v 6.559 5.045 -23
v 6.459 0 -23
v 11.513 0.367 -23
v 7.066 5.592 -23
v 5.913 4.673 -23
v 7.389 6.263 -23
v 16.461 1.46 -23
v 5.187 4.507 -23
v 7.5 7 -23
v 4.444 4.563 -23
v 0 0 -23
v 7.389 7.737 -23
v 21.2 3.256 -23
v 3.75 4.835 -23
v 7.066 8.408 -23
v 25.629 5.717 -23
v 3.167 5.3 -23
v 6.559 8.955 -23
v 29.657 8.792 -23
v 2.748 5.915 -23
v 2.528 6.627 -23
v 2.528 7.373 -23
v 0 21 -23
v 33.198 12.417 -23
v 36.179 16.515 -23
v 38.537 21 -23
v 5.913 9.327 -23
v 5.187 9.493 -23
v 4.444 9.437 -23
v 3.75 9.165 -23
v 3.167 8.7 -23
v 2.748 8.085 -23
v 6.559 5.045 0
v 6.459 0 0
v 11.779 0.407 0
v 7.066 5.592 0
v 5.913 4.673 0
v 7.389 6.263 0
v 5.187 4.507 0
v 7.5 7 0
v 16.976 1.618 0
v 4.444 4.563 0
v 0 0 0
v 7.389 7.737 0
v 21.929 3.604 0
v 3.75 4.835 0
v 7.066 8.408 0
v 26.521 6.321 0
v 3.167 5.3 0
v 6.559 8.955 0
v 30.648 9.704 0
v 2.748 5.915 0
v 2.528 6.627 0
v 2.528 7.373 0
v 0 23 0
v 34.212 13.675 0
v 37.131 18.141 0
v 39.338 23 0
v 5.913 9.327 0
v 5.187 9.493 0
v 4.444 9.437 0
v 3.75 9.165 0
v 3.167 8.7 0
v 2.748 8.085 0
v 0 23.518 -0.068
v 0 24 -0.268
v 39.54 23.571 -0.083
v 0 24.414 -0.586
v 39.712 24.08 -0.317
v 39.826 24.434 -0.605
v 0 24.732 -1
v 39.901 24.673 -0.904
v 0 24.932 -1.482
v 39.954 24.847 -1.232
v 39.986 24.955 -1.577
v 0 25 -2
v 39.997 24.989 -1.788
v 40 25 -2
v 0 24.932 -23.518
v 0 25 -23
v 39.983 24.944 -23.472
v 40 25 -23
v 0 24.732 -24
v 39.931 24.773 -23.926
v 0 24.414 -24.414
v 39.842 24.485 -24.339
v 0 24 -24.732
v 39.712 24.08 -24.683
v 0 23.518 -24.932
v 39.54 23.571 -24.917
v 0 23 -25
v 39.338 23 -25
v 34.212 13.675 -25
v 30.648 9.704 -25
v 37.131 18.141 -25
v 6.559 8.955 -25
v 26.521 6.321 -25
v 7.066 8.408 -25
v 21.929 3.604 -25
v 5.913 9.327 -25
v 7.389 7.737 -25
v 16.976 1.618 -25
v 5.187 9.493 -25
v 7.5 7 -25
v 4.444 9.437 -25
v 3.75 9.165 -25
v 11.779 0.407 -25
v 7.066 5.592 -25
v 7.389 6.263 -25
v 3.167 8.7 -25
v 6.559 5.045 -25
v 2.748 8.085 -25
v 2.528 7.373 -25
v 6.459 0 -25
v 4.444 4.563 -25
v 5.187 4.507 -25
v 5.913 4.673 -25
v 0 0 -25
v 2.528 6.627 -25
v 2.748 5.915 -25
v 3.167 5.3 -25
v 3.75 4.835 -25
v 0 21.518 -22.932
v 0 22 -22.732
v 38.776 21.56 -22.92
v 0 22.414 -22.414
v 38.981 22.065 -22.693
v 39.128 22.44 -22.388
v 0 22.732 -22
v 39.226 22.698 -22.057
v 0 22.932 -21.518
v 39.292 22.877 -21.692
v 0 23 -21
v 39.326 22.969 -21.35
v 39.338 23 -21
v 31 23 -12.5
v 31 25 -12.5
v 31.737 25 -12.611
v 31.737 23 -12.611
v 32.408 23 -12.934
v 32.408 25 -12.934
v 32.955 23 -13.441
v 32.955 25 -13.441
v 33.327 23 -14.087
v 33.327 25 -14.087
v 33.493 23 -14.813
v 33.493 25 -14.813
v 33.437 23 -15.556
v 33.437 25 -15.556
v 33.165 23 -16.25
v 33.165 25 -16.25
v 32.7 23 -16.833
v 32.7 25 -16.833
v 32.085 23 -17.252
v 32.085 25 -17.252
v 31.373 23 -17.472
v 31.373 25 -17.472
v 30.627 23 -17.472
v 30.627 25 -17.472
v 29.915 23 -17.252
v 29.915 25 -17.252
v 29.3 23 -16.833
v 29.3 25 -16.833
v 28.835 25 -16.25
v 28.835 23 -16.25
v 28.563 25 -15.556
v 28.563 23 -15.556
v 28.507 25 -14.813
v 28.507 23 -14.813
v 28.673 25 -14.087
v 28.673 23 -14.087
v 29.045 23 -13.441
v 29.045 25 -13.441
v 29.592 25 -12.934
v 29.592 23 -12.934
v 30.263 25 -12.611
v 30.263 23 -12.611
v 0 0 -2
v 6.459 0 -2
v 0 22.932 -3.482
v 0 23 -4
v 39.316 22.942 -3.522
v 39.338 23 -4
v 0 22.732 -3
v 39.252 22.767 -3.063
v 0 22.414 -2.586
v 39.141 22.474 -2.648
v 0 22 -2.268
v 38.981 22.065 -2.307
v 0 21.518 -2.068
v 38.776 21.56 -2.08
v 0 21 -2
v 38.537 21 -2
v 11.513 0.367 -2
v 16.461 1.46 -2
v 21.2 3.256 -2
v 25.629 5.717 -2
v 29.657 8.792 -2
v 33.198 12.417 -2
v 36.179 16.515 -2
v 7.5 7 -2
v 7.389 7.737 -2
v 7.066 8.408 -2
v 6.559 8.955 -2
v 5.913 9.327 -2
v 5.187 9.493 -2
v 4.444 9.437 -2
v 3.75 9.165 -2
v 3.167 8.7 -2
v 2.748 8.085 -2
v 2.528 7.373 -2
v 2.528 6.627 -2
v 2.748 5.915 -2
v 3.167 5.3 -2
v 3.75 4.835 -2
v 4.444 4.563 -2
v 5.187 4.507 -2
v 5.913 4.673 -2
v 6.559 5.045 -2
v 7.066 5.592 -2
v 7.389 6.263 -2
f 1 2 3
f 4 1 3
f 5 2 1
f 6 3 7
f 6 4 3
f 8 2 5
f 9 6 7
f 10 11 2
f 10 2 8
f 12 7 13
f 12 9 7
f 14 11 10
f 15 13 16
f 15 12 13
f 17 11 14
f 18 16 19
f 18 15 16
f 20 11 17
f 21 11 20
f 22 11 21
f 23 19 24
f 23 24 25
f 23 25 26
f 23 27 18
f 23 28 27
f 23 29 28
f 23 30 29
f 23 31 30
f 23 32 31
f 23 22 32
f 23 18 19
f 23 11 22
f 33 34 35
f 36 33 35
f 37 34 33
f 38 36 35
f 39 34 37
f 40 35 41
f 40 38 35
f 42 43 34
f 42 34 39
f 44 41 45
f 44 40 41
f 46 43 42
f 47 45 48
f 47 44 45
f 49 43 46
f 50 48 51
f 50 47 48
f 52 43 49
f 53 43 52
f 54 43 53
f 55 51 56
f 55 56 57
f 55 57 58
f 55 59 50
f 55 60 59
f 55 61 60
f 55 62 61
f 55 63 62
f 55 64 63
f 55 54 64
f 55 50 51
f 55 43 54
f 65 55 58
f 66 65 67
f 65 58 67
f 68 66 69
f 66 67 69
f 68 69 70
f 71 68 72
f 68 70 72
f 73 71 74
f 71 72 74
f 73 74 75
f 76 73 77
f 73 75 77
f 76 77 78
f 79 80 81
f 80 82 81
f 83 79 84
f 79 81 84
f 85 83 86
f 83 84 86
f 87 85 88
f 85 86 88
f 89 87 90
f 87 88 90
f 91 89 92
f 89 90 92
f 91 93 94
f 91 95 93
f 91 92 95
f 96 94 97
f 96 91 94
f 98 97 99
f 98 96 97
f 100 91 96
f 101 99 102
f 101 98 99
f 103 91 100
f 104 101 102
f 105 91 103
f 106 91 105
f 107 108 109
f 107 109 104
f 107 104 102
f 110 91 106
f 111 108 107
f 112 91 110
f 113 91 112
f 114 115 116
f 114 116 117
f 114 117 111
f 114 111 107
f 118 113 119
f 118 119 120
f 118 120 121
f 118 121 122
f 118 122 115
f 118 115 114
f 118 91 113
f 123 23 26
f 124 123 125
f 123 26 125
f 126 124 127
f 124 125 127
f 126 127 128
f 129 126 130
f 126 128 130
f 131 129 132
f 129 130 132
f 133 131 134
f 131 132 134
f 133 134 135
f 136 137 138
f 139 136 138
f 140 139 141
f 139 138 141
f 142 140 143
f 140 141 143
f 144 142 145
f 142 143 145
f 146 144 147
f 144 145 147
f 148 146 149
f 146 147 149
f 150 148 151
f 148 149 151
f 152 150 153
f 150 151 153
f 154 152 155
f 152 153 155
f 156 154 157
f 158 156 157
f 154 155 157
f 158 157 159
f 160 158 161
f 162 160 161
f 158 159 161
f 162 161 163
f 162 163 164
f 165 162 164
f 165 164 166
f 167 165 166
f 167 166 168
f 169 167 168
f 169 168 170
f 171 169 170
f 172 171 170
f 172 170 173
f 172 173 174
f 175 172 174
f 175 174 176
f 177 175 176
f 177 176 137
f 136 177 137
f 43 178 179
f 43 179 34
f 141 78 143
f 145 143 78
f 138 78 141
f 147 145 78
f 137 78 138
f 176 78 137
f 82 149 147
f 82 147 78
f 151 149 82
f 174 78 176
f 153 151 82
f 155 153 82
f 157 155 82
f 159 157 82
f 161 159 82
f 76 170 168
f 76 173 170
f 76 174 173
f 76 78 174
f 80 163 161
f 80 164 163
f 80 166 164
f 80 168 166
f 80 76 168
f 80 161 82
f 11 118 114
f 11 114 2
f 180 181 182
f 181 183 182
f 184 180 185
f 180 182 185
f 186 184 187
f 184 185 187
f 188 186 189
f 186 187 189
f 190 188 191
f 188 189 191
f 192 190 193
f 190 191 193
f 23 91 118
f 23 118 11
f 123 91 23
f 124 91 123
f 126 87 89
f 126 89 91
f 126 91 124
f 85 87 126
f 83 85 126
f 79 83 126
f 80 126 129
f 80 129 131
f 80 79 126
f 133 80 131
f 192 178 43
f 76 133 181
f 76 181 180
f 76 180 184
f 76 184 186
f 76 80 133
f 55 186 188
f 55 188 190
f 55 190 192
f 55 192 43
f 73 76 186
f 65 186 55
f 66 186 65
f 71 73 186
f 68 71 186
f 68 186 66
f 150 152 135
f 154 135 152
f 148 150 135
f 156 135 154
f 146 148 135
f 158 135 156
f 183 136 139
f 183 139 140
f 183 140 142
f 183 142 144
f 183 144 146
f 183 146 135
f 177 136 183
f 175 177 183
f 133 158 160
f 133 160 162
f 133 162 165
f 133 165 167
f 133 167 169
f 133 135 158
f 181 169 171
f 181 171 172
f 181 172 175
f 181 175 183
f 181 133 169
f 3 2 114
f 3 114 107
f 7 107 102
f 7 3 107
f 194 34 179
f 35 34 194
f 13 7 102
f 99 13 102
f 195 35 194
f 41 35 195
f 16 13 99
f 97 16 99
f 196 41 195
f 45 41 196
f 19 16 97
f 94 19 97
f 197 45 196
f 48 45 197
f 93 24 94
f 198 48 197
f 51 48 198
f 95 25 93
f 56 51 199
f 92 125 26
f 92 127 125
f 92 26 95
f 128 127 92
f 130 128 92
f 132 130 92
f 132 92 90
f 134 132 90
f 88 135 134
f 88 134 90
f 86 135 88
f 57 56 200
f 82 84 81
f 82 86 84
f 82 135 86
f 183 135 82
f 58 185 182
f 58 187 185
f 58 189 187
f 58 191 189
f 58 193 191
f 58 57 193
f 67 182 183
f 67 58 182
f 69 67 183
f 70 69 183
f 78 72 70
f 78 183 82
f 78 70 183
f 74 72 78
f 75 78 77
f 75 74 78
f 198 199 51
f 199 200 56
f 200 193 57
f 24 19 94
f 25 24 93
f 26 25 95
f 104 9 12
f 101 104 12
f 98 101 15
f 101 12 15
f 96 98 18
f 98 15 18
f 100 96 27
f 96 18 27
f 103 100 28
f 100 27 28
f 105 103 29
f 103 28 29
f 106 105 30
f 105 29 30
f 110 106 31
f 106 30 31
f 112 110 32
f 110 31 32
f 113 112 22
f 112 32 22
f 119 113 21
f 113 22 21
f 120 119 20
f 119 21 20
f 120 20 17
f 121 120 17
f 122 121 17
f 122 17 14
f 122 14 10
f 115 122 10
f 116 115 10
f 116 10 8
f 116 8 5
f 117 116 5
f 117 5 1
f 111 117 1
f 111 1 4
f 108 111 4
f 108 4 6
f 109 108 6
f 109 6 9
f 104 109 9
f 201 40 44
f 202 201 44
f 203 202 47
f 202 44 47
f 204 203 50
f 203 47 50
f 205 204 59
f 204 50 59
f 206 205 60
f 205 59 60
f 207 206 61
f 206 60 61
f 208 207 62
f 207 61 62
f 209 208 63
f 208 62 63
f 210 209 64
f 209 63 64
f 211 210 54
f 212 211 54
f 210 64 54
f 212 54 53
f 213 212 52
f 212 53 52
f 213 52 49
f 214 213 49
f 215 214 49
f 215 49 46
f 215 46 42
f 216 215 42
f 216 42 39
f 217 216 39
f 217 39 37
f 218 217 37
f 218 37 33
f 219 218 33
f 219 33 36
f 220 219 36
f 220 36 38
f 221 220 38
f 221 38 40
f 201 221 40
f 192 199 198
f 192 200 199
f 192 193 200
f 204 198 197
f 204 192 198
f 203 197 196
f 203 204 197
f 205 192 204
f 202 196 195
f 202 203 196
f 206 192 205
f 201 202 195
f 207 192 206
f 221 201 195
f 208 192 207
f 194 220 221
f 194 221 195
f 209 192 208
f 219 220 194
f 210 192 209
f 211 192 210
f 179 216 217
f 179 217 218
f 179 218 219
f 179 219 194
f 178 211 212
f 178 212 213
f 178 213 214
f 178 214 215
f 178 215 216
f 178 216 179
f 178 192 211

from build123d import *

# Parameters (mm, degrees)
EXTRUDE_1_DEPTH     = 40
CUT_EXTRUDE_1_DEPTH = 40
SKETCH_4_R          = 2.5
CUT_EXTRUDE_2_DEPTH = 54.38539126
SKETCH_5_R          = 2.5
CUT_EXTRUDE_3_DEPTH = 54.38539126
FILLET_1_R          = 2


with BuildPart() as part:
    # 草图1 → 凸台-拉伸1 (new body)
    with BuildSketch(Plane(origin=(0, 0, 0), x_dir=(0, 0, -1), z_dir=(1, 0, 0))):
        Polygon((0, 0), (0, 25), (25, 25), (25, 0), (23, 0), (23, 23), (2, 23), (2, 0), align=None)
    extrude(amount=EXTRUDE_1_DEPTH)

    # 草图3 → 切除-拉伸1 (cut)
    with BuildSketch(Plane.XY):
        with BuildLine():
            Line((40, 25), (40, 0))
            Line((40, 0), (6.458980338, 0))
            ThreePointArc((6.458980338, 0), (27.375481001, 6.937569599), (40, 25))
        make_face()
    extrude(amount=-CUT_EXTRUDE_1_DEPTH, mode=Mode.SUBTRACT)

    # 草图4 → 切除-拉伸2 (cut, through all)
    with BuildSketch(Plane(origin=(0, 25, 0), x_dir=(1, 0, 0), z_dir=(0, 1, 0))):
        with Locations(Location((31, 15, 0), (0, 0, 270))):
            Circle(SKETCH_4_R)
    extrude(amount=-CUT_EXTRUDE_2_DEPTH, mode=Mode.SUBTRACT)

    # 草图5 → 切除-拉伸3 (cut, through all)
    with BuildSketch(Plane.XY):
        with Locations((5, 7)):
            Circle(SKETCH_5_R)
    extrude(amount=-CUT_EXTRUDE_3_DEPTH, mode=Mode.SUBTRACT)

    # 圆角1
    fillet_1_edges = [part.edges().sort_by_distance(p)[0] for p in [
        (20, 25, 0),
        (20, 25, -25),
        (19.668772392, 23, -23),
        (19.668772392, 23, -2),
    ]]
    fillet(fillet_1_edges, radius=FILLET_1_R)


solid = part.part
